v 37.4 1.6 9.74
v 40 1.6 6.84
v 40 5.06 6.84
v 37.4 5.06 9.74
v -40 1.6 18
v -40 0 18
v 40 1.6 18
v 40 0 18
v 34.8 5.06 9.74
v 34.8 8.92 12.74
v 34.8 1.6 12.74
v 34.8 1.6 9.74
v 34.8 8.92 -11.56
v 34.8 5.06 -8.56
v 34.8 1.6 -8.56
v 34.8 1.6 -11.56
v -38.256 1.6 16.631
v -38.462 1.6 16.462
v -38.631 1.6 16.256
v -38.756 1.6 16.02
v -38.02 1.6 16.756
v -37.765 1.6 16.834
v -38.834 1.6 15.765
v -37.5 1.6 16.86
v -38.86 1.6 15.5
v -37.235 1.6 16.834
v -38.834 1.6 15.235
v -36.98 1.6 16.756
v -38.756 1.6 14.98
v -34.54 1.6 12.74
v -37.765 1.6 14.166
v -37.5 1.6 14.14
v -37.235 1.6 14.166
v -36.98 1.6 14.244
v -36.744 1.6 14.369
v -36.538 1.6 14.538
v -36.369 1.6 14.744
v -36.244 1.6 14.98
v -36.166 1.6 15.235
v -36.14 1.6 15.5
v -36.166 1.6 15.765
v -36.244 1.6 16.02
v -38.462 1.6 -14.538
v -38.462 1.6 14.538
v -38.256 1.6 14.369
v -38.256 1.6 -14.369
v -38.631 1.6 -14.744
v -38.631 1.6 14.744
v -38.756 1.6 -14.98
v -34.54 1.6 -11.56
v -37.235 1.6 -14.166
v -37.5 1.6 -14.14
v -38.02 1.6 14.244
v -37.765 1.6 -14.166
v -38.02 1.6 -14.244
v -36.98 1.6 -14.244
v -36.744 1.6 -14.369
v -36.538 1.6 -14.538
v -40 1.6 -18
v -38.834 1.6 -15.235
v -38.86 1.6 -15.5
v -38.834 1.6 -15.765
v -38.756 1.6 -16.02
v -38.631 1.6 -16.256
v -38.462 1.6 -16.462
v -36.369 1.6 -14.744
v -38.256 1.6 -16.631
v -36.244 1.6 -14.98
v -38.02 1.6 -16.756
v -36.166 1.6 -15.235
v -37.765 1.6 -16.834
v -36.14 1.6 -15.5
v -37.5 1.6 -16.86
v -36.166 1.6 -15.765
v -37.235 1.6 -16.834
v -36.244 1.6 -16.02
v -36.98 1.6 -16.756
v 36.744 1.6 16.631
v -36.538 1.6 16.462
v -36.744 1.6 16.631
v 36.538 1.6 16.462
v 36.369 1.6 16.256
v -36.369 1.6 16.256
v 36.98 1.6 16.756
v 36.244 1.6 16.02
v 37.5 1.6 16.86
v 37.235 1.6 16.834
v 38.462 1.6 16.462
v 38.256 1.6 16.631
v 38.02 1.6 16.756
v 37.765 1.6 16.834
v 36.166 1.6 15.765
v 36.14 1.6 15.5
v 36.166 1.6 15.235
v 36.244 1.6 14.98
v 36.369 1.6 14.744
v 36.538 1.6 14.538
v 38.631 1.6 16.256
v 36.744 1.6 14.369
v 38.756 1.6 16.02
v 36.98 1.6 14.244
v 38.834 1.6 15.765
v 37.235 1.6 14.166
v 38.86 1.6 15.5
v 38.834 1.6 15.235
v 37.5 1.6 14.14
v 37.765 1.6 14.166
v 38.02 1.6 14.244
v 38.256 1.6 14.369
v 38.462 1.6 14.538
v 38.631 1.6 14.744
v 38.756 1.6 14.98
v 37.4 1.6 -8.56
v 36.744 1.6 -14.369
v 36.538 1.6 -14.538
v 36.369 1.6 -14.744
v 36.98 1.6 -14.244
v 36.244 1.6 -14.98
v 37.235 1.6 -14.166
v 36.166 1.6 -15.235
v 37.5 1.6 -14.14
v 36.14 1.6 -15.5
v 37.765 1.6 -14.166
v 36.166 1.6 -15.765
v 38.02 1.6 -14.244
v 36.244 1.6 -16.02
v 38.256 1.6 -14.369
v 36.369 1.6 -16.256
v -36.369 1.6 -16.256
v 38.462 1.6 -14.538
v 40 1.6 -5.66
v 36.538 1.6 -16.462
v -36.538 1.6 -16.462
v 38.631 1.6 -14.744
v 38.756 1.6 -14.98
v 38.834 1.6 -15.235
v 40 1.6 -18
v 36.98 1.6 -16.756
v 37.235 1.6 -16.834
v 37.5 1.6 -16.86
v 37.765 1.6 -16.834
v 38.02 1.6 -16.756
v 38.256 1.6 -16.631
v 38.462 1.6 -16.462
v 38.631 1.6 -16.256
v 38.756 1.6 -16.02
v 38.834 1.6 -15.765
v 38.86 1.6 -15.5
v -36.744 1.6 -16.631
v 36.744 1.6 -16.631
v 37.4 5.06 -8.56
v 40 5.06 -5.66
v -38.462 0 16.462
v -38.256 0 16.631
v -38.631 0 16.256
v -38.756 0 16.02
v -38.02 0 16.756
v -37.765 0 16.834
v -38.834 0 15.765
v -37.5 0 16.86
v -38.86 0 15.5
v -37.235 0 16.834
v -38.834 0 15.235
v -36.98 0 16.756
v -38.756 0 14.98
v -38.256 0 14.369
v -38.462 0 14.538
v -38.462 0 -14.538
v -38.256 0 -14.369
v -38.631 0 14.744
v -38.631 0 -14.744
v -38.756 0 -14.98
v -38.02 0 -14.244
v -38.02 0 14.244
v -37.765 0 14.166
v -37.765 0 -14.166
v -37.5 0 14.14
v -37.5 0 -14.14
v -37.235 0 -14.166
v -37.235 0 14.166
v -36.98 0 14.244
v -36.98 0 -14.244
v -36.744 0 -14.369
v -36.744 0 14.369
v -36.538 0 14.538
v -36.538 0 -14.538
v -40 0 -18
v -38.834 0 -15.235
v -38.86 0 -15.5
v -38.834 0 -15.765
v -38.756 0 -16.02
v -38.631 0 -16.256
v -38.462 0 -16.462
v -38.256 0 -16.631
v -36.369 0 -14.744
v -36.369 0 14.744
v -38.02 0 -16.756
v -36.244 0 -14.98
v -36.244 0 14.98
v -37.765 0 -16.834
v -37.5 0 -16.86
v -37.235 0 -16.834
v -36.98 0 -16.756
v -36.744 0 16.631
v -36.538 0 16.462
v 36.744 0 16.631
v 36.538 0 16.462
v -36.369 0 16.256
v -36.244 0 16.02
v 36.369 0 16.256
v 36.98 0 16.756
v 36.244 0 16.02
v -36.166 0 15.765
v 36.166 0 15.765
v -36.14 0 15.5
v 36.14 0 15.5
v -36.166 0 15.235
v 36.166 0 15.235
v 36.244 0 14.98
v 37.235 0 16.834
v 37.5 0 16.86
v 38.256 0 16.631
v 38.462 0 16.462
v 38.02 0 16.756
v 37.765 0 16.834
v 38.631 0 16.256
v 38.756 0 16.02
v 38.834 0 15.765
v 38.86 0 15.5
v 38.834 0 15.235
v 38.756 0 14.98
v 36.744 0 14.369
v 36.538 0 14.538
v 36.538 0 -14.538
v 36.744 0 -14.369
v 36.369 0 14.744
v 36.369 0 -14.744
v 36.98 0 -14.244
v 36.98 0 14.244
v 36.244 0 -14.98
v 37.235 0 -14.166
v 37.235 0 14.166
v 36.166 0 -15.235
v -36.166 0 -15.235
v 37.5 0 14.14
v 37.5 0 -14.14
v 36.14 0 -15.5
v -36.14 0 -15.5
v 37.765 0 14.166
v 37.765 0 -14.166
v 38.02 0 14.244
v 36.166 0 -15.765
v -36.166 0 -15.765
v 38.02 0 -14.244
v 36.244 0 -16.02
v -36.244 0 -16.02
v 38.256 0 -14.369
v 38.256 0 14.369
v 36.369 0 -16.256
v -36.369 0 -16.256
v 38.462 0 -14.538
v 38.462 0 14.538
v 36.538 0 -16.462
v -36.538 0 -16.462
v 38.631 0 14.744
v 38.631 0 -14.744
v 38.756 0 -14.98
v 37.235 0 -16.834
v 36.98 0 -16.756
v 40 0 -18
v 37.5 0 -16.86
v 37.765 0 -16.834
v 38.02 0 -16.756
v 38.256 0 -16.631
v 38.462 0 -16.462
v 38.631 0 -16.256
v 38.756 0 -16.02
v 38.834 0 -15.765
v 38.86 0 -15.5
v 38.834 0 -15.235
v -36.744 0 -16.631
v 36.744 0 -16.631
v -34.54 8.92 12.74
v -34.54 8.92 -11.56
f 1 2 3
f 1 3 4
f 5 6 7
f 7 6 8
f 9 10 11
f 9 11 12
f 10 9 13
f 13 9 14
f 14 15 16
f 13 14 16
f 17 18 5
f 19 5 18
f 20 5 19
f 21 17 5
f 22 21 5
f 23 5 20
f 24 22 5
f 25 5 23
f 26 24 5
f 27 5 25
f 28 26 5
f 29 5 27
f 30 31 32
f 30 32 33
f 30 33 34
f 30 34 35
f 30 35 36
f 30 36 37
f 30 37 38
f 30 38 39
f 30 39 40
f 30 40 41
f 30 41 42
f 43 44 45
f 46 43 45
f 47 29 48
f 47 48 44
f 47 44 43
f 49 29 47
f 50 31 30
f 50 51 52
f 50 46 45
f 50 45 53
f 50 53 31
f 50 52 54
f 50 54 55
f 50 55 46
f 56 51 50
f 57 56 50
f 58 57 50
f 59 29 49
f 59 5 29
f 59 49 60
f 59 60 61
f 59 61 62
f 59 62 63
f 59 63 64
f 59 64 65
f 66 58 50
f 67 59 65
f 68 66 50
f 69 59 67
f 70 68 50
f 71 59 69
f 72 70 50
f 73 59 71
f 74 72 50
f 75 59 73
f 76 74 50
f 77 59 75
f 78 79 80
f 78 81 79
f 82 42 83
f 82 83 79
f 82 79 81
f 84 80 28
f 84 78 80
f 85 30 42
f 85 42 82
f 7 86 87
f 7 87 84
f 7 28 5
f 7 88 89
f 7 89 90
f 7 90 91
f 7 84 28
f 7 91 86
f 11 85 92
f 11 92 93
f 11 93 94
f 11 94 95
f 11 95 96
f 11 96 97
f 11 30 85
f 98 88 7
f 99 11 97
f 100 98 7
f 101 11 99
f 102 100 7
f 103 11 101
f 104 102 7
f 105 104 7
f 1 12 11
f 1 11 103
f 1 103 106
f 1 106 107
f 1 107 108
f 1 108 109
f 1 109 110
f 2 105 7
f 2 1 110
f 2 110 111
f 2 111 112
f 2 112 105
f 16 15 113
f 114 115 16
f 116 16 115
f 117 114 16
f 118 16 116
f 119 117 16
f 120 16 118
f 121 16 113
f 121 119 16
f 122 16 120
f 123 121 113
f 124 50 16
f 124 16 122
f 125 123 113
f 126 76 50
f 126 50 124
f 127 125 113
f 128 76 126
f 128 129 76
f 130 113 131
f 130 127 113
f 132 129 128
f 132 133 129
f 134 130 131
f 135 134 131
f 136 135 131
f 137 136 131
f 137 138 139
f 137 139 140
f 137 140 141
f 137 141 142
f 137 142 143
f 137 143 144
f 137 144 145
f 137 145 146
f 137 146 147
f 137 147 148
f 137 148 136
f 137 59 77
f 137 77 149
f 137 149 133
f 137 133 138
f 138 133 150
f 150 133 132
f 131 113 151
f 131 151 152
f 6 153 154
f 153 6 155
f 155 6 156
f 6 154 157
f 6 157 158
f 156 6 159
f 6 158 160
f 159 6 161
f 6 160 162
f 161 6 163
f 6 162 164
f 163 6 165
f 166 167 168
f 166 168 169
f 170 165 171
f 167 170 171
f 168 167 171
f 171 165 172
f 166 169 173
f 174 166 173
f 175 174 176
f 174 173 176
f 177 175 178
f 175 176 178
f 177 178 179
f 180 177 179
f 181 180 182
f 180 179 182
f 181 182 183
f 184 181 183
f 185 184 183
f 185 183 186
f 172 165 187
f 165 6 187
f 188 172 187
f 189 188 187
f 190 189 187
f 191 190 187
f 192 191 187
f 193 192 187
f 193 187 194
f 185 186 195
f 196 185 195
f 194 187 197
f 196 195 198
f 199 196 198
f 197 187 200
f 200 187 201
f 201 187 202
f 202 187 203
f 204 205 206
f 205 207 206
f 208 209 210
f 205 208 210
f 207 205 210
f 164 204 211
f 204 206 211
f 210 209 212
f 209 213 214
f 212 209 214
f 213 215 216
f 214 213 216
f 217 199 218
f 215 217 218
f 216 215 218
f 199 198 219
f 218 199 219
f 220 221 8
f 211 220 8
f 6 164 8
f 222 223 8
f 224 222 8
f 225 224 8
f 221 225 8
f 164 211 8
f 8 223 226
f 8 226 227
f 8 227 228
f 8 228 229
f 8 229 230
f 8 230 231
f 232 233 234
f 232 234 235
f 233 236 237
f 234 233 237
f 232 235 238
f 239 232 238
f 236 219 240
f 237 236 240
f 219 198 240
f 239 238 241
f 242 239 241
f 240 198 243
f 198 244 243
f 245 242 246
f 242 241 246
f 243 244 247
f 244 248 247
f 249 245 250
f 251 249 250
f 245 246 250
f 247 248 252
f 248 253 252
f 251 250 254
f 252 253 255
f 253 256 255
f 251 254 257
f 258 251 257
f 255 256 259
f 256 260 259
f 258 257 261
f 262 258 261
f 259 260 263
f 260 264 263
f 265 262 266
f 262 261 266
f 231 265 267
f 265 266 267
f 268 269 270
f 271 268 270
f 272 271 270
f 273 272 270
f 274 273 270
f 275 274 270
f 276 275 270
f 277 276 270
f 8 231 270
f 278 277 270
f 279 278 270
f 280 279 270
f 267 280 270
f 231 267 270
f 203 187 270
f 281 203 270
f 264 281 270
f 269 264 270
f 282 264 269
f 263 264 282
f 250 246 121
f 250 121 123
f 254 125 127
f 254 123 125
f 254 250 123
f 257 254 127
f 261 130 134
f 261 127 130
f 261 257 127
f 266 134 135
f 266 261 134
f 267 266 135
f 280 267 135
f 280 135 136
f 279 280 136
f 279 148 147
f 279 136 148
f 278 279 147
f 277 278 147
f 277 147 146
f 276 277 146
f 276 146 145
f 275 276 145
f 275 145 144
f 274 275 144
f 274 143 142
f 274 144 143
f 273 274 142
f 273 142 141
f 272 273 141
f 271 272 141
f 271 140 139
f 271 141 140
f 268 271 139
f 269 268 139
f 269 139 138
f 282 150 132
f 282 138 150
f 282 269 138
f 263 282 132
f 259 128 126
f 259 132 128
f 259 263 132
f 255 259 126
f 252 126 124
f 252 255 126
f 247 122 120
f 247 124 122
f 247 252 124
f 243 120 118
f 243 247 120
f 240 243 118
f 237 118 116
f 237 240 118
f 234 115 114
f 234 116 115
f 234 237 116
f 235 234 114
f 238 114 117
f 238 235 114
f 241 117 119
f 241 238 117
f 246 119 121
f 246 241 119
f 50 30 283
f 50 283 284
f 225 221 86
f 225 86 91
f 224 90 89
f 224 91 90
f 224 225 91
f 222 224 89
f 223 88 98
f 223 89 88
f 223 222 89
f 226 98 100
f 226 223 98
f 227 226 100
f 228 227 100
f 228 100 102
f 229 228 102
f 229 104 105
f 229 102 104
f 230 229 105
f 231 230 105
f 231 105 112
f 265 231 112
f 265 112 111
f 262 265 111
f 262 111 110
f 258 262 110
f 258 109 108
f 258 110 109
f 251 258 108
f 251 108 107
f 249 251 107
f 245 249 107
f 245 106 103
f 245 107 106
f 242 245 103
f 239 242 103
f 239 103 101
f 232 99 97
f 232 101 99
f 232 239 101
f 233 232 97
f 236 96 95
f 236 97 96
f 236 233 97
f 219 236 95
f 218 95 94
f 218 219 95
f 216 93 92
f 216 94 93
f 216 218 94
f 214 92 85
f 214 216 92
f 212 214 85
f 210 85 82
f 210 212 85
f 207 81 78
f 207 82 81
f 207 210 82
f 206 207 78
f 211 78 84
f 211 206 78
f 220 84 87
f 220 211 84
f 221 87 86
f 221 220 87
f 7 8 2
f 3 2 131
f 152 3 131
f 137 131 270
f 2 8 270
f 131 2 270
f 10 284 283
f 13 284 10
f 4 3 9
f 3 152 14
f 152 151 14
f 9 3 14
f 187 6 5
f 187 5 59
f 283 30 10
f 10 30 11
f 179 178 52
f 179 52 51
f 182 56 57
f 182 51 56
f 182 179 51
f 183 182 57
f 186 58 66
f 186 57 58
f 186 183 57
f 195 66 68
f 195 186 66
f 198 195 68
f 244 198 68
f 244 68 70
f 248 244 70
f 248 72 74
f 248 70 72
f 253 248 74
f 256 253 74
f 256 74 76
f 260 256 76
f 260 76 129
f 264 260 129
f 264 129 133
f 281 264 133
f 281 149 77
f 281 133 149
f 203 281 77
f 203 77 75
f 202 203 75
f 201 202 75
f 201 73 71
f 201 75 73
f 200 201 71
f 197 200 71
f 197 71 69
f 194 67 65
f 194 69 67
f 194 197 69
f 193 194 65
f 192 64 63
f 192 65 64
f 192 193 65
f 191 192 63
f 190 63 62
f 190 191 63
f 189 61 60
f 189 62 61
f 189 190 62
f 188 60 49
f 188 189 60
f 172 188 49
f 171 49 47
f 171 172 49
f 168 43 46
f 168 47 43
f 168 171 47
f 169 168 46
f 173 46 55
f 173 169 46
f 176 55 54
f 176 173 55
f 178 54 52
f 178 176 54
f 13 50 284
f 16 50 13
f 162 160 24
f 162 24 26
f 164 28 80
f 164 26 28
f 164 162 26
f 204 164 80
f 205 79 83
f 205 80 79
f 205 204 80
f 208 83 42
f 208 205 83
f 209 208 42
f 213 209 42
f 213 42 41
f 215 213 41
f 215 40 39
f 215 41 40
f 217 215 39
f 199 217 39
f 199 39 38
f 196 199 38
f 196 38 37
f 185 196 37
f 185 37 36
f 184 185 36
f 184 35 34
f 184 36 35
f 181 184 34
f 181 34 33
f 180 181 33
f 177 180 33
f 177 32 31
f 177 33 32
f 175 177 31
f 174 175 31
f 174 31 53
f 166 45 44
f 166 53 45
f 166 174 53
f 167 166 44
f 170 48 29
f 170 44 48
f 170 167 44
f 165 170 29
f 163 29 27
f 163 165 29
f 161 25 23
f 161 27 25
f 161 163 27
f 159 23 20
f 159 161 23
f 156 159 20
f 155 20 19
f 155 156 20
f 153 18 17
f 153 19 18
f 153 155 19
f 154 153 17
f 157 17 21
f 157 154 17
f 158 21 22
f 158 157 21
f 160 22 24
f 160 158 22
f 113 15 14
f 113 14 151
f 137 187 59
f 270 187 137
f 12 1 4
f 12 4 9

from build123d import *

# Parameters (mm, degrees)
SKETCH1_W               = 80
SKETCH1_H               = 36
BOSS_EXTRUDE1_DEPTH     = 1.6
SKETCH2_W               = 69.34
SKETCH2_H               = 24.3
BOSS_EXTRUDE2_DEPTH     = 7.32
BOSS_EXTRUDE3_DEPTH     = 3.46
CUT_EXTRUDE1_DEPTH      = 45.470016865
CUT_EXTRUDE1_DEPTH_BACK = 45.470016865
SKETCH4_R               = 1.36


with BuildPart() as part:
    # Sketch1 → Boss-Extrude1 (new body)
    with BuildSketch(Plane(origin=(0, 0, 0), x_dir=(1, 0, 0), z_dir=(0, 1, 0))):
        Rectangle(SKETCH1_W, SKETCH1_H)
    extrude(amount=BOSS_EXTRUDE1_DEPTH)

    # Sketch2 → Boss-Extrude2 (add)
    with BuildSketch(Plane(origin=(0, 1.6, 0), x_dir=(1, 0, 0), z_dir=(0, 1, 0))):
        with Locations((0.13, -0.59)):
            Rectangle(SKETCH2_W, SKETCH2_H)
    extrude(amount=BOSS_EXTRUDE2_DEPTH)

    # Sketch3 → Boss-Extrude3 (add)
    with BuildSketch(Plane(origin=(0, 1.6, 0), x_dir=(1, 0, 0), z_dir=(0, 1, 0))):
        Polygon((40, 5.66), (40, -6.84), (37.4, -9.74), (34.8, -9.74), (34.8, 8.56), (37.4, 8.56), align=None)
    extrude(amount=BOSS_EXTRUDE3_DEPTH)

    # Sketch4 → Cut-Extrude1 (cut, two sides: drawn at the far end of the back side and taken through both)
    with BuildSketch(Plane(origin=(0, 1.6, 0), x_dir=(1, 0, 0), z_dir=(0, 1, 0)).offset(-CUT_EXTRUDE1_DEPTH_BACK)):
        with Locations(Location((-37.5, 15.5, 0), (0, 0, 270))):
            Circle(SKETCH4_R)
        with Locations(Location((-37.5, -15.5, 0), (0, 0, 270))):
            Circle(SKETCH4_R)
        with Locations(Location((37.5, -15.5, 0), (0, 0, 270))):
            Circle(SKETCH4_R)
        with Locations(Location((37.5, 15.5, 0), (0, 0, 270))):
            Circle(SKETCH4_R)
    extrude(amount=CUT_EXTRUDE1_DEPTH + CUT_EXTRUDE1_DEPTH_BACK, mode=Mode.SUBTRACT)


solid = part.part
